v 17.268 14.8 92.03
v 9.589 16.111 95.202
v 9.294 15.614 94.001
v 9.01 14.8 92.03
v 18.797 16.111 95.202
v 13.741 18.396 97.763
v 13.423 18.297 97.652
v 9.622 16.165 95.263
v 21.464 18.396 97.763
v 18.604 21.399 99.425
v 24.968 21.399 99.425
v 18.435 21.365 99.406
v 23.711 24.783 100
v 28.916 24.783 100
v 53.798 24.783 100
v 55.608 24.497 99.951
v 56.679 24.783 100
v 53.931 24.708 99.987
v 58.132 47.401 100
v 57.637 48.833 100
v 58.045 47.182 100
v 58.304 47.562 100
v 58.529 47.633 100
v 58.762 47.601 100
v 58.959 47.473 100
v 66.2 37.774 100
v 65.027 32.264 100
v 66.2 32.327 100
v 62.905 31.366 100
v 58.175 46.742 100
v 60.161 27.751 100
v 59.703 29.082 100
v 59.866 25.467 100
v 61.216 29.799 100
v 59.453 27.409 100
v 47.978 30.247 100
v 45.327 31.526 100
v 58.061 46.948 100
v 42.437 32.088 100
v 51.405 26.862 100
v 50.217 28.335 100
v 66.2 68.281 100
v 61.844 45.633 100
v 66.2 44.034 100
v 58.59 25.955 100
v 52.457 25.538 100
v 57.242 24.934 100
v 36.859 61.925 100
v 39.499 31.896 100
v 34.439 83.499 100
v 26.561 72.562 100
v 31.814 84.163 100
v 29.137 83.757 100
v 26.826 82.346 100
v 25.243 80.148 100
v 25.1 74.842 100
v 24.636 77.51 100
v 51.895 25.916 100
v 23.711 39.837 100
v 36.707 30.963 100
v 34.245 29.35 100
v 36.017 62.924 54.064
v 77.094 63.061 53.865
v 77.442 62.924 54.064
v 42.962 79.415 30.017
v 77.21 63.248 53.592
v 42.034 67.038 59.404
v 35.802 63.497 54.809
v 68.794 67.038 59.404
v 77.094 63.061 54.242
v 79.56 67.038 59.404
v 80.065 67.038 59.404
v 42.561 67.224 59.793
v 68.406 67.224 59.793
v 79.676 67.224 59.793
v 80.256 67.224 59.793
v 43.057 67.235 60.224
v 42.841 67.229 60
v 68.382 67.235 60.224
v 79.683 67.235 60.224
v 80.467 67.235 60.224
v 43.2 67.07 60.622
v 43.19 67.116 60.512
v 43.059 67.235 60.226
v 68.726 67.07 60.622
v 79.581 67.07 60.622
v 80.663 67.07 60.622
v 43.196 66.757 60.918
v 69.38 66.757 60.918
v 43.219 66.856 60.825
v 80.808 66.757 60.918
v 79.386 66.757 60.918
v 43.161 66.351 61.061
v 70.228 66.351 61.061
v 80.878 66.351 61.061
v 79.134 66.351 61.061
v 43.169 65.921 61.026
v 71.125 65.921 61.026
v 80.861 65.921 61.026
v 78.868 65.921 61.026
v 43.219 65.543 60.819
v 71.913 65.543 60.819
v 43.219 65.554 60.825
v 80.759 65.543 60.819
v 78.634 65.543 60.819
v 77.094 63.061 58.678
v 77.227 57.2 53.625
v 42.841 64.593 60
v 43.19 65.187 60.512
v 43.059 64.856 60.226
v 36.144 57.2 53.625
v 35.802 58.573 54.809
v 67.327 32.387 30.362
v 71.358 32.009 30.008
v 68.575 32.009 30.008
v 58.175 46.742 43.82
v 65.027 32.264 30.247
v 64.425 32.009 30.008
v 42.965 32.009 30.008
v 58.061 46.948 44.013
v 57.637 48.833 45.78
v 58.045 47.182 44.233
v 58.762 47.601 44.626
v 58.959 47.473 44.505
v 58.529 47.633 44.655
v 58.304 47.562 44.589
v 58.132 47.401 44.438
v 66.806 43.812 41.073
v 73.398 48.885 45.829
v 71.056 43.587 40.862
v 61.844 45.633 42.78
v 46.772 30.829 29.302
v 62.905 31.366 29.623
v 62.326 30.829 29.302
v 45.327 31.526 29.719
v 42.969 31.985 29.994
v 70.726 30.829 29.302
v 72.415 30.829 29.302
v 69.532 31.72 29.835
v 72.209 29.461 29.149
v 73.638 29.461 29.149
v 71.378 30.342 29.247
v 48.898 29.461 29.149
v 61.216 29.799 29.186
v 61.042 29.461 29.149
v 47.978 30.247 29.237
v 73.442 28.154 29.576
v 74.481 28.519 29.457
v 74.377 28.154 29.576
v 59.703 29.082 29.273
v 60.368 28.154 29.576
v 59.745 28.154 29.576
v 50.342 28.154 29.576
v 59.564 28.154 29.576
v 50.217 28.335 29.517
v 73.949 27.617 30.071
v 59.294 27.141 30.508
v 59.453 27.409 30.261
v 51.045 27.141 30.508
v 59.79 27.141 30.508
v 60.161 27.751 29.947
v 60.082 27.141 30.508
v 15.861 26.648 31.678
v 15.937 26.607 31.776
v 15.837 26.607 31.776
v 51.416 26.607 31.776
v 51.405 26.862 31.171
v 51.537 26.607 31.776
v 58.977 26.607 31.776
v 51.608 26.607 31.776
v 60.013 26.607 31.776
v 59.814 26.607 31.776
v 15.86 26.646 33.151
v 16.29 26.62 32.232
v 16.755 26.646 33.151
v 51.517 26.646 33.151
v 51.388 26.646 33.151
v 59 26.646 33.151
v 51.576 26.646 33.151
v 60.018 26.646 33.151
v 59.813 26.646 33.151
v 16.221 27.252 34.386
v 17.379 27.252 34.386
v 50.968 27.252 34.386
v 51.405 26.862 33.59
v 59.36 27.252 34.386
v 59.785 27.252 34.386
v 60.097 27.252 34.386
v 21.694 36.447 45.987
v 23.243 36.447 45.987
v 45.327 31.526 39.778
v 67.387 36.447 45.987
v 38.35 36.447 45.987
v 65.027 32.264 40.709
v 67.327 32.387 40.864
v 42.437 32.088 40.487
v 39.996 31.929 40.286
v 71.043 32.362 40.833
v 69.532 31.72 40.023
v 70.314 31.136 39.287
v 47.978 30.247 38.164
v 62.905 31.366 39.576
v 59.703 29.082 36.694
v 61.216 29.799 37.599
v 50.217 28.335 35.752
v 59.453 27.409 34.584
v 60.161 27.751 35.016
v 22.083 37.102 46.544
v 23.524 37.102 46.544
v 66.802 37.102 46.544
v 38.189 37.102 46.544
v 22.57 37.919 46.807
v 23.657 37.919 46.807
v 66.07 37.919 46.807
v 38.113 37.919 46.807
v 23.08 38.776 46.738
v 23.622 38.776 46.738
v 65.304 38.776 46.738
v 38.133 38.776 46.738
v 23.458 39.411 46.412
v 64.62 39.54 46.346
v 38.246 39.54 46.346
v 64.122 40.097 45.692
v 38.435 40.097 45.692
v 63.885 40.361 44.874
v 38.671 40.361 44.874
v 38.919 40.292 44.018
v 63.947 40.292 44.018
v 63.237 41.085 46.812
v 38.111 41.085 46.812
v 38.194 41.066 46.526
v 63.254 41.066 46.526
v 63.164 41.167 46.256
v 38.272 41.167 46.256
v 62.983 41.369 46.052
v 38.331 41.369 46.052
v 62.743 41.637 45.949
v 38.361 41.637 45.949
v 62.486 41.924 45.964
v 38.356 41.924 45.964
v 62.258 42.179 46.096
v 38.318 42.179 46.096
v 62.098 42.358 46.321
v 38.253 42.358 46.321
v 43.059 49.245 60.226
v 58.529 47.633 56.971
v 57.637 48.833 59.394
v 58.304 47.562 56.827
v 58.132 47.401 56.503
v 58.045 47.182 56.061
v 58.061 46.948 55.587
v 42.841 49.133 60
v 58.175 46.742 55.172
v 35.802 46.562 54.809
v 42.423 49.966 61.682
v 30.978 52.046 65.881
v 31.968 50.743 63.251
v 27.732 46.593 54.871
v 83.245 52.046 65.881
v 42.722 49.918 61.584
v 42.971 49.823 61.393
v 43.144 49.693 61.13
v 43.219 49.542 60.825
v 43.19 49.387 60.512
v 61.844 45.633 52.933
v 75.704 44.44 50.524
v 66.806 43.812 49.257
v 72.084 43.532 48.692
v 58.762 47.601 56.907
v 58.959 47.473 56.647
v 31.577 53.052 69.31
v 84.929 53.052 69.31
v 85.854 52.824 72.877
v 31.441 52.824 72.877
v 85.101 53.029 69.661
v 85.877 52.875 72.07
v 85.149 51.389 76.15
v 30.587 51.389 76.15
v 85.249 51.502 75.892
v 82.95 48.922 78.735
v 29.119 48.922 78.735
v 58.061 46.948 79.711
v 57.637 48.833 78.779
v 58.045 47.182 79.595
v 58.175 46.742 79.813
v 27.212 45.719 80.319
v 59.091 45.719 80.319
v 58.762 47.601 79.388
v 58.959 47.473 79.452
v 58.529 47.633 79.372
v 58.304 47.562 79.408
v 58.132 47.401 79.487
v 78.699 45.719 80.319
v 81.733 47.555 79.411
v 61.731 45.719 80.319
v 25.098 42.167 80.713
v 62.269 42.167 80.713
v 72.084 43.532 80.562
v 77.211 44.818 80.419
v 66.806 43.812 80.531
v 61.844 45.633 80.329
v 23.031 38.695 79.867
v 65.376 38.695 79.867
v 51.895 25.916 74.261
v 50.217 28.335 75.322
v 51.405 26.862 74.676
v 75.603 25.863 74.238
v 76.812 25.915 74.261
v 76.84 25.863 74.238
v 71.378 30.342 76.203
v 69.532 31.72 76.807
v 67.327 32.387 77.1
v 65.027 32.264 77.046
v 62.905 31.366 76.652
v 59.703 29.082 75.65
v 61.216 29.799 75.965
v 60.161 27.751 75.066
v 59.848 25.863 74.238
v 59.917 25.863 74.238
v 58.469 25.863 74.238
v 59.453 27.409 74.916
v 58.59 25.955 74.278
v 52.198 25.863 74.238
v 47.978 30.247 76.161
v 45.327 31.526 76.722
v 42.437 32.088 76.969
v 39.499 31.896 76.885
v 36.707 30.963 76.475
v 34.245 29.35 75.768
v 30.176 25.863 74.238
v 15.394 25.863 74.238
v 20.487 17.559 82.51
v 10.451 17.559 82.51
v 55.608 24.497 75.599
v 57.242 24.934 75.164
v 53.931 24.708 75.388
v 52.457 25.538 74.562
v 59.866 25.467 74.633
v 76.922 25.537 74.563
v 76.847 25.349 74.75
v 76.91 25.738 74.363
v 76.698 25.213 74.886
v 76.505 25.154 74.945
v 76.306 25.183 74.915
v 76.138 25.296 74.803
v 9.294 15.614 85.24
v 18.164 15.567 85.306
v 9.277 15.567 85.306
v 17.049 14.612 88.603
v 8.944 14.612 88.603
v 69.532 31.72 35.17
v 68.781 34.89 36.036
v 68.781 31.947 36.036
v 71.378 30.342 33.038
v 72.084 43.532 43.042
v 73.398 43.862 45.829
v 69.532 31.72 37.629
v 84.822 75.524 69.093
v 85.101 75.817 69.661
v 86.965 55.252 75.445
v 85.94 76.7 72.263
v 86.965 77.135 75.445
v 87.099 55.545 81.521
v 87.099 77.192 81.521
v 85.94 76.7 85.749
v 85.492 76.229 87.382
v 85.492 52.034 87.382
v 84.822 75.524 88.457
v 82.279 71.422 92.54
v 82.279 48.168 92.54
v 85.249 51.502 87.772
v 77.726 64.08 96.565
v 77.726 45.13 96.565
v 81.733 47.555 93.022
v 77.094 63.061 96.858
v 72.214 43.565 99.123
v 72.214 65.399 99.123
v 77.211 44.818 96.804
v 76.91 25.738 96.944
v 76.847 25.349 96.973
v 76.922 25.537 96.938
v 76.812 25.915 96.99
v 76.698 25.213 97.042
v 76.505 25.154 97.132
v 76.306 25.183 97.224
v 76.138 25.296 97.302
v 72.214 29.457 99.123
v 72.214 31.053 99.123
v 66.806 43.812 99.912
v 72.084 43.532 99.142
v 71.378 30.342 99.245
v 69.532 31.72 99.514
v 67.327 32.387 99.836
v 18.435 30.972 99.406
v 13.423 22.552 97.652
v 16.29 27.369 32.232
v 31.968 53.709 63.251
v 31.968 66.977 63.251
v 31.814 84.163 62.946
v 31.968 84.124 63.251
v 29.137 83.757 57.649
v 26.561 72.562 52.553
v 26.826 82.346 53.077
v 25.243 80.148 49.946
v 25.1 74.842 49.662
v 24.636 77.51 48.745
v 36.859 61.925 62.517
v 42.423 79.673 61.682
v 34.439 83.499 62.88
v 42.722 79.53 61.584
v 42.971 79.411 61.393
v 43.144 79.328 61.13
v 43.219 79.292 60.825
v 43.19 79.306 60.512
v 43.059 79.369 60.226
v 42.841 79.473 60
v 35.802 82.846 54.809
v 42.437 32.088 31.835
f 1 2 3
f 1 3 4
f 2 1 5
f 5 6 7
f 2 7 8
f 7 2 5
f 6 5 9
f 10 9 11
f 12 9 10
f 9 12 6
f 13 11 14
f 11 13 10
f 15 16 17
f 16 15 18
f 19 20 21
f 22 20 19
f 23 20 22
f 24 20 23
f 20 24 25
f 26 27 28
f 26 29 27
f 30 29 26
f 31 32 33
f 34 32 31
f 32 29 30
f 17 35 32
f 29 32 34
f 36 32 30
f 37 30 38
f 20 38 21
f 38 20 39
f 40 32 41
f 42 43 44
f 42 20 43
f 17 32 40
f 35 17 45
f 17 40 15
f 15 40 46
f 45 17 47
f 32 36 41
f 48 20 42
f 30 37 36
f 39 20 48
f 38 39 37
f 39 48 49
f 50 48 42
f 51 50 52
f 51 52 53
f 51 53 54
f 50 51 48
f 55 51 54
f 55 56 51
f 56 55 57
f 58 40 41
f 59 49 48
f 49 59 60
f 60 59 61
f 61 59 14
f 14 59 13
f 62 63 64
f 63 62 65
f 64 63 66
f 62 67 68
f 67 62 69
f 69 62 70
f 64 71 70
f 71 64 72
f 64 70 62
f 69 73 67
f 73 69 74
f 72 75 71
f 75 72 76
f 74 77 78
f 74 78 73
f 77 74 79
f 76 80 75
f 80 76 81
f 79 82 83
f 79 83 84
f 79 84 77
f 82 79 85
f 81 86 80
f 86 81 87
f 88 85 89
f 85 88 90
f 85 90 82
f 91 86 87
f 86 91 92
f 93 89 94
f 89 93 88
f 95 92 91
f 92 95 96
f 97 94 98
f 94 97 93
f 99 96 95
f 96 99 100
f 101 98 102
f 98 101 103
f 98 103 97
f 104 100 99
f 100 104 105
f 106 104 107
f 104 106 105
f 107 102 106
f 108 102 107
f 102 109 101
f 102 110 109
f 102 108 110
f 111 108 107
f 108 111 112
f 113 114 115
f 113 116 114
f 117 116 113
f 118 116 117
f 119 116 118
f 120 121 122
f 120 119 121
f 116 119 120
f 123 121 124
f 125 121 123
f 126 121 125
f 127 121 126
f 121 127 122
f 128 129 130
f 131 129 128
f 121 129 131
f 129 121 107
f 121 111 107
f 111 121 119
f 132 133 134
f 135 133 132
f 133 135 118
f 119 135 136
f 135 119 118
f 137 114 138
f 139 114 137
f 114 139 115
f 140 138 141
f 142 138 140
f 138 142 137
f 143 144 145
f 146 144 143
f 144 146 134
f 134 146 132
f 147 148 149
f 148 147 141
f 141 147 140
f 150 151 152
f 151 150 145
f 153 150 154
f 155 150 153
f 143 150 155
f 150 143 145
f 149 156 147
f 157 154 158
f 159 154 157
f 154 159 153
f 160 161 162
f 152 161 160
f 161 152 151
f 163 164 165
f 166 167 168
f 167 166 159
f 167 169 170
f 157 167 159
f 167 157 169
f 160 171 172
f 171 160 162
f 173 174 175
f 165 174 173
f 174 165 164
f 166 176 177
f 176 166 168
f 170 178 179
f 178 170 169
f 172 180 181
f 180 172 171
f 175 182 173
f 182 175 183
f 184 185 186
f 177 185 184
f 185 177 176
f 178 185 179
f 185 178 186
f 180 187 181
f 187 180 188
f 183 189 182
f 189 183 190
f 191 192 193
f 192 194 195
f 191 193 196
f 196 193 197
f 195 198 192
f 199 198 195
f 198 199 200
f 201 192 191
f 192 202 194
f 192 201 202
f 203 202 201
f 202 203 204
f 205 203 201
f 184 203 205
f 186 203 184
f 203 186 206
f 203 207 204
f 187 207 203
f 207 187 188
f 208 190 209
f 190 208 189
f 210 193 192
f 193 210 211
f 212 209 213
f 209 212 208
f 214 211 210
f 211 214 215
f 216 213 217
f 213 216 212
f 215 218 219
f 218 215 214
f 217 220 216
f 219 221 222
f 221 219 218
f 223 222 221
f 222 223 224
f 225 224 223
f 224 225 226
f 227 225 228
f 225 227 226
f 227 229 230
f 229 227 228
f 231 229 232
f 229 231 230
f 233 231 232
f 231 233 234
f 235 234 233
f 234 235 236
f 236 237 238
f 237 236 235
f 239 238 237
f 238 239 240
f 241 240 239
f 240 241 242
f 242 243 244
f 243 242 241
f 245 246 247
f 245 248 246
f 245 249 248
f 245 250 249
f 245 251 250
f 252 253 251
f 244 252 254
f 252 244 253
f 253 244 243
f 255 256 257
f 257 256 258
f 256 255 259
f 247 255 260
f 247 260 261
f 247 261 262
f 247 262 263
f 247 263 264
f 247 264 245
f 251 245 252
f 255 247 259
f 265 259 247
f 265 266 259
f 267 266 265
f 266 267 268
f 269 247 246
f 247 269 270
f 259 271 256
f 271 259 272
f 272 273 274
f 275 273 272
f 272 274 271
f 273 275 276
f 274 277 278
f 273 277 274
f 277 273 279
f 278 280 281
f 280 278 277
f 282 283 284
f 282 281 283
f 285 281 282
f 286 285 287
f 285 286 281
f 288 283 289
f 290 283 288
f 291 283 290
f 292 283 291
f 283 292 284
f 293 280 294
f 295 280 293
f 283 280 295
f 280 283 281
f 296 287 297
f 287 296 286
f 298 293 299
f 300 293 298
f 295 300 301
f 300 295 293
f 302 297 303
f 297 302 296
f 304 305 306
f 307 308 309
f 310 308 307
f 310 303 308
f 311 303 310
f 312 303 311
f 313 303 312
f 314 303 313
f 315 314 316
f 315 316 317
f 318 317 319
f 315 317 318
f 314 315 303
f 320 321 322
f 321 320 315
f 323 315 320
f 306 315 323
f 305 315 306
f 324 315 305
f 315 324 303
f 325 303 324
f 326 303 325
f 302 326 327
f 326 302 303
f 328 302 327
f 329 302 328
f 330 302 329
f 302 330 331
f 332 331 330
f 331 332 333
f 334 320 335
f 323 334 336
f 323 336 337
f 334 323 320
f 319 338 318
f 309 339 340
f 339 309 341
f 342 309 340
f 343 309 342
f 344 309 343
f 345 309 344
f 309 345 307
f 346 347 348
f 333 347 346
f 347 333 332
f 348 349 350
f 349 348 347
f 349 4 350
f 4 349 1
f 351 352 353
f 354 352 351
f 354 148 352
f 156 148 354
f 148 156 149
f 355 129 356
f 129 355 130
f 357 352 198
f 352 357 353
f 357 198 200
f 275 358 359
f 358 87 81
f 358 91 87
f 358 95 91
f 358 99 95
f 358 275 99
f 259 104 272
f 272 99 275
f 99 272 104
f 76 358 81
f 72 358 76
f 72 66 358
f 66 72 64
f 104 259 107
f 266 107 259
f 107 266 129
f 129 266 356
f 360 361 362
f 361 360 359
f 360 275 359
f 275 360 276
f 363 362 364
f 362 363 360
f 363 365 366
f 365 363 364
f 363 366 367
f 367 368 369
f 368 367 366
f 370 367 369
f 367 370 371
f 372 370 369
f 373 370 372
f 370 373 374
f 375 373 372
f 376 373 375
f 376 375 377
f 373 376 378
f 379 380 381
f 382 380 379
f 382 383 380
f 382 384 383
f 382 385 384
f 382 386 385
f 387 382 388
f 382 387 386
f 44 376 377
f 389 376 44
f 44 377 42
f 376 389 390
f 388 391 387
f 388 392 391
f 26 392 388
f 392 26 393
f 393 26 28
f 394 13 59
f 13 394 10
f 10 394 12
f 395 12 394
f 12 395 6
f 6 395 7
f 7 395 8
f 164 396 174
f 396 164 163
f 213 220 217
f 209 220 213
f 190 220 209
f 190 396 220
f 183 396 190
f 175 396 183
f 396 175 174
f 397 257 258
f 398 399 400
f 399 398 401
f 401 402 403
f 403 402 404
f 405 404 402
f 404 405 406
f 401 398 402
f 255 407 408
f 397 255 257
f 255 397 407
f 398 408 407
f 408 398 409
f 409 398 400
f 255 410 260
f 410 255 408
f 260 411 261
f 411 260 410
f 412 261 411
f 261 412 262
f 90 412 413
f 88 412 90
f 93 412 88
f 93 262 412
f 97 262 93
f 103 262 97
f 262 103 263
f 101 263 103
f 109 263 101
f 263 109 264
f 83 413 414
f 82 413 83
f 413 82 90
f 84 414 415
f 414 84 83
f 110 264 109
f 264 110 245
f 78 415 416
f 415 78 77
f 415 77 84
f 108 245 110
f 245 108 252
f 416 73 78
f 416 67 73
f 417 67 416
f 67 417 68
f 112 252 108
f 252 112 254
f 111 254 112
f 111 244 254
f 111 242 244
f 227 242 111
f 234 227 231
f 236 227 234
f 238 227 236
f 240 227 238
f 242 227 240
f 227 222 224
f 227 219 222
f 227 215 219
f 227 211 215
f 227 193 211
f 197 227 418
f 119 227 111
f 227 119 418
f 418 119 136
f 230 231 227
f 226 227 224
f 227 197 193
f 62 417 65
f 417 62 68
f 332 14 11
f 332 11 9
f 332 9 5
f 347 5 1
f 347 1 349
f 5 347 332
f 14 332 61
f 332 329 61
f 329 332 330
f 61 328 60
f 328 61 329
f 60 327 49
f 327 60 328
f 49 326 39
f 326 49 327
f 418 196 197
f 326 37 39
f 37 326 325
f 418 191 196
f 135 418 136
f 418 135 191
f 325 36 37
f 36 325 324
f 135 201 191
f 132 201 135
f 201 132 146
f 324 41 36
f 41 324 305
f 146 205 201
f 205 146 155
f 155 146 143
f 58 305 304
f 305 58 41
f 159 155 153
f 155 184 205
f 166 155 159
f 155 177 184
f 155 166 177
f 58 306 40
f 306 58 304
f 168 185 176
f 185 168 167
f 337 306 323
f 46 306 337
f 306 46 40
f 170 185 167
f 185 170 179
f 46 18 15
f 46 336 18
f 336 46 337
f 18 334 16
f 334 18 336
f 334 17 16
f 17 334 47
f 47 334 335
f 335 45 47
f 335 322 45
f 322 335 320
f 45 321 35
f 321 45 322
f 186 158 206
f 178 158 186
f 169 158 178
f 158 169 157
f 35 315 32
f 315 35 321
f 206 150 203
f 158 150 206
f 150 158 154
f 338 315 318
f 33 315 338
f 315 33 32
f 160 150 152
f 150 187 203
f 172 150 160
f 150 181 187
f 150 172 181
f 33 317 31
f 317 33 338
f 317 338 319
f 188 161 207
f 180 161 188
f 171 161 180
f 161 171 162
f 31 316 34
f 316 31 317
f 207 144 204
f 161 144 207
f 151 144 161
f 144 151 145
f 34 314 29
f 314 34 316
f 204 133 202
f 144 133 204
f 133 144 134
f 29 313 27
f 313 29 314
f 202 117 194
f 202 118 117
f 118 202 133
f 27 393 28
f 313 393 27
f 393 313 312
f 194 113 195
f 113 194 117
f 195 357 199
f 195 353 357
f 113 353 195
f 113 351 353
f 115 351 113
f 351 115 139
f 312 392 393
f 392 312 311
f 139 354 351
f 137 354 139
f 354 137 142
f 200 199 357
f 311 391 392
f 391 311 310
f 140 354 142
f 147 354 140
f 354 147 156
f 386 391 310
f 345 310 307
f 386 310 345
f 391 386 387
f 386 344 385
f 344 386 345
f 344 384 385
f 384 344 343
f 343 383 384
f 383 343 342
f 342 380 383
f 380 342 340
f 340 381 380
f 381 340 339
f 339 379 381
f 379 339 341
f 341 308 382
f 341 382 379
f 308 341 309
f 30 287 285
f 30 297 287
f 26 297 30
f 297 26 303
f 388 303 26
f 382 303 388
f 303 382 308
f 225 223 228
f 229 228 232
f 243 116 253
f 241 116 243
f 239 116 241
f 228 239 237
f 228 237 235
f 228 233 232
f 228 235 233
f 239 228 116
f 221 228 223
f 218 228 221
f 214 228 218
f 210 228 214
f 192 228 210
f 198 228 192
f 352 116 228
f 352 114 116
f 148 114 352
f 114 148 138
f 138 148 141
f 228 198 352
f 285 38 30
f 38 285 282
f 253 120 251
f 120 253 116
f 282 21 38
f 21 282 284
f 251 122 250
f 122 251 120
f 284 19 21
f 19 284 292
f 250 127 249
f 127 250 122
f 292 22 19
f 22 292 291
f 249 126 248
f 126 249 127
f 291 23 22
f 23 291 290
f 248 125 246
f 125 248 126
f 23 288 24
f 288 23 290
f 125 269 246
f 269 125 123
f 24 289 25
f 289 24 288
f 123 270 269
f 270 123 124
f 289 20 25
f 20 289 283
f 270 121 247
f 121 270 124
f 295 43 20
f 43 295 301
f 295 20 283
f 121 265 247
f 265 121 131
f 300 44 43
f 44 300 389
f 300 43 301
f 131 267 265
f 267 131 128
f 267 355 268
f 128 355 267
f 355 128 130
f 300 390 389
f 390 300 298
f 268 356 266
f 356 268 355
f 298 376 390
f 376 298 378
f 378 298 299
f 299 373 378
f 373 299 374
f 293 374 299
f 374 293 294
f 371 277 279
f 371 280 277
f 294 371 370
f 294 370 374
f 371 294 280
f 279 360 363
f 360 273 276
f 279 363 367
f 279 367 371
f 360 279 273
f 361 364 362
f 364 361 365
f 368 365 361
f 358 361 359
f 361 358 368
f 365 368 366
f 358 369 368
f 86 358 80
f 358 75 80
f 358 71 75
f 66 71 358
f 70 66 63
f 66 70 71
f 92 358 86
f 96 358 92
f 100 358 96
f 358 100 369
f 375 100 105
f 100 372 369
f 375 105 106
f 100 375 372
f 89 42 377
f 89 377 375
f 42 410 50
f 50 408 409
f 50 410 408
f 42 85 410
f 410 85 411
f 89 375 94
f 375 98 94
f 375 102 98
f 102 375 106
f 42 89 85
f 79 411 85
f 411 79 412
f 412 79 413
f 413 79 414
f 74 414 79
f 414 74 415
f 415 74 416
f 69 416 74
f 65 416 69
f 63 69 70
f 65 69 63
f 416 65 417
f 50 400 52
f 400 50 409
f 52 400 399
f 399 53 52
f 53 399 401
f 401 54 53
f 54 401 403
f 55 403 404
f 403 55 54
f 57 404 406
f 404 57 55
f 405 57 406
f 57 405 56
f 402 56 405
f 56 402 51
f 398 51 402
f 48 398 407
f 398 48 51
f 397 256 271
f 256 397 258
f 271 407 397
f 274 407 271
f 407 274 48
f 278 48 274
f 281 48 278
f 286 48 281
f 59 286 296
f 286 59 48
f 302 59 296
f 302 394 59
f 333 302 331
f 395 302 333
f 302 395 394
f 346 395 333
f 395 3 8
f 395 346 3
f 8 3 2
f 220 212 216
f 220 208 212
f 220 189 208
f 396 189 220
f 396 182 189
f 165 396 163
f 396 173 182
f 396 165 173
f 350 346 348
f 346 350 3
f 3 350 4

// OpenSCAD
// Library: round-anything
// Version: 1.0
// Author: IrevDev
// Copyright: 2017
// License: GPL 3
test();

 //callExamples(); //uncomment to view examples
module test()
{

px=buildNIpolygon([[100,0],[100,100],[0,100],[0,0]],8);
py=buildNIpolygon([[100,0],[100,100],[0,100],[0,0]],8);
pz=buildNIpolygon([[100,0],[100,100],[0,100],[0,0]],8);
 
prx=pr(px);
pry=pr(py);
prz=pr(pz);

Rx=polyRound(px,prx,7);
Ry=polyRound(py,pry,7);
Rz=polyRound(pz,prz,7);
intersection(){
rotate([0,-90,0]) translate([0,0,-100])linear_extrude(100,convexity=100)polygon(Rx); 
rotate([90,0,0])translate([0,0,-100]) linear_extrude(100,convexity=100) polygon(Ry); 
 linear_extrude(100,convexity=100) polygon(Rz); 
}

rotate([0,-90,0]) %polyline(px);
rotate([90,0,0])%polyline(py);
%polyline(pz);
rotate([0,-90,0]) %polygon(Rx);
rotate([90,0,0])%polygon(Ry);
%polygon(Rz);
}
function pr(p)=let(Lp1=len(p)-1)[for(i=[0:Lp1]) let(legal=spread(p[ wrap(i-1,Lp1+1)],p[i],p[ wrap(i+1,Lp1+1)]))rnd(0.2* legal,  0.4* legal)];
function spread(p1,p2,p3)=min(
point_to_line(p3,p1,p2)
,
point_to_line(p1,p2,p3)
);
function point_to_line(p,a,b)=
let(
pa = p - a, 
ba = b - a,
h = clamp( (pa*ba)/ (ba*ba)))
norm( pa - ba*h ) ;
function clamp(a, b = 0, c = 1) = min(max(a, b), c); 
function wrap(x,x_max=1,x_min=0) = (((x - x_min) % (x_max - x_min)) + (x_max - x_min)) % (x_max - x_min) + x_min;
function rnd(a = 1, b = 0, s = []) = 
  s == [] ? 
   (rands(min(a, b), max(   a, b), 1)[0]) 
  : 
   (rands(min(a, b), max(a, b), 1, s)[0])
  ; 
module callExamples(){
    //Example of how a parametric part might be designed with this tool 
    width=20;       height=25;
    slotW=8;        slotH=15;
    slotPosition=8;
    minR=1.5;       farcornerR=6;
    internalR=3;
    points=[[0,0],[0,height],[slotPosition,height],[slotPosition,height-slotH],
    [slotPosition+slotW,height-slotH],[slotPosition+slotW,height],[width,height],[width,0]];
    radiuses=[minR,minR,minR,internalR,internalR,minR,minR,farcornerR];
    translate([-30,0,0])polygon(polyRound(points,radiuses));
    %translate([-30,0,0.2])polygon(points);
    
    //Example of features 2
    //   1     2     3      4      5       6     
    b=[[-5,0],[5,3],[0,7],[8,7],[20,20],[10,0]]; //points
    br=[1,     1.5,   0,   10,     1,     10]; //radiuses
    polygon(polyRound(b,br,15));
    %translate([0,0,0.2])polygon(b);
    
    
    //Example of features 3
    //   1     2       3      4       5     6
    p=[[0,0],[0,20],[15,15],[3,10],[15,0],[6,2]];//points
    pr=[1,     1,      0,     3,      1,   10];//radiuses
    translate([25,0,0])polygon(polyRound(p,pr,30));
    %translate([25,0,0.2])polygon(p);
}


function polyRound(p,r,fn=5)=
    //turns the orginal array in (last element, array, first element) since the points are processed 3 at a time.
    let(Lp1=len(p)-1,temp=[for(i=[0:len(p)-1]) 
round3points(
p[wrap(i-1,Lp1+1)],
p[wrap(i+0,Lp1+1)],
p[wrap(i+1,Lp1+1)],
r[wrap(i,Lp1+1)],
fn)])//passes three points at a time to polyRound()
    //temp ends up being a 3 dimensional array where each arc is grouped together, so the below code breaks it up and turns it back into a 2d array, ie list of coordinates (is there a better way of doing this? a way to stop it from becomeing a 3d array in the first place?
    [for (a = temp)
        for (b = a) b];

function round3points(p1,p2,p3,r,fn)=

      dot(un(p1-p2),(p2-p3))>0.98?[ p2  ]
    : 
    let(ang=cosineRuleAngle(p1,p2,p3))//angle between the lines
    let(tangD=r/tan(ang/2))//distance to the tangent point from p2
    let(circD=r/sin(ang/2))//distance to the circle centre from p2
    let(a12=abs(atan(getGradient(p1,p2))))//angle of line 1
    let(a23=abs(atan(getGradient(p2,p3))))//angle of line 2
    
    let(vec21=p1-p2)//vector from p2 to p1
    let(vec23=p3-p2)//vector from p2 to p3
    let(dir21x=vec21[0]==0?0:vec21[0]/abs(vec21[0]))//tangent along line p2 to p1 x polerisation. Returns 1,-1 or 0
    let(dir21y=vec21[1]==0?0:vec21[1]/abs(vec21[1]))//tangent along line p2 to p1 y polerisation. Returns 1,-1 or 0
    let(dir23x=vec23[0]==0?0:vec23[0]/abs(vec23[0]))//tangent along line p3 to p1 x polerisation. Returns 1,-1 or 0
    let(dir23y=vec23[1]==0?0:vec23[1]/abs(vec23[1]))//tangent along line p3 to p1 Y polerisation. Returns 1,-1 or 0
    
    let(t12=[p2[0]+dir21x*cos(a12)*tangD,p2[1]+dir21y*sin(a12)*tangD])//tangent point along line p2 to p2 by offseting from p2
    let(t23=[p2[0]+dir23x*cos(a23)*tangD,p2[1]+dir23y*sin(a23)*tangD])//tangent point along line p2 to p3 by offseting from p2
    
    let(vec_=getMidpoint(t12,t23)-p2)//vector from P1 to the midpoint of the two tangents
    let(dirx_=vec_[0]==0?0:vec_[0]/abs(vec_[0]))//circle center point x polerisation
    let(diry_=vec_[1]==0?0:vec_[1]/abs(vec_[1]))//circle center point y polerisation
    let(a_=abs(atan(getGradient(getMidpoint(t12,t23),p2))))//angle of line from tangent midpoints to p2
    let(cen=[p2[0]+dirx_*cos(a_)*circD,p2[1]+diry_*sin(a_)*circD])//circle center by offseting from p2
    
    let(e1=(p2[0]-p1[0])*(p2[1]+p1[1]))//edge 1
    let(e2=(p3[0]-p2[0])*(p3[1]+p2[1]))//edge 2
    let(e3=(p1[0]-p3[0])*(p1[1]+p3[1]))//edge 3
    let(CWorCCW=(e1+e2+e3)/abs(e1+e2+e3))//rotation of the three points cw or ccw?
   CentreN2PointsArc(t12,t23,cen,CWorCCW,fn);
function dot (a,b)=a*b; // dotproduct is implied in * of vextoes

function un(v)=v/max(norm(v),1e-16);
        
function CentreN2PointsArc(p1,p2,cen,CWorCCW,fn)=
    let(r=pointDist(p1,cen))
    let(CircA1=invtan(p1[0]-cen[0],p1[1]-cen[1]))//angle of line 1
    let(CircA2=cosineRuleAngle(p2,cen,p1))//angle between the lines
    [for(i=[0:fn]) [cos(CircA1+(CircA2/fn)*-i*CWorCCW)*r+cen[0],sin(CircA1+(CircA2/fn)*-i*CWorCCW)*r+cen[1]]];
 
function invtan(run,rise)=
    let(a=abs(atan(rise/run)))
    rise==0&&run>0?0:rise>0&&run>0?a:rise>0&&run==0?90:rise>0&&run<0?180-a:rise==0&&run<0?180:rise<0&&run<0?a+180:rise<0&&run==0?270:rise<0&&run>0?360-a:"error";

function cosineRuleAngle(p1,p2,p3)=
    let(p12=abs(pointDist(p1,p2)))
    let(p13=abs(pointDist(p1,p3)))
    let(p23=abs(pointDist(p2,p3)))
    acos((sq(p23)+sq(p12)-sq(p13))/(2*p23*p12));
    
function getIntersect(m1,m2,k1,k2)=
    let(x=(k2-k1)/(m1-m2))
    let(y=m1*x+k1)
    [x,y];

function sq(x)=x*x;
function getGradient(p1,p2)=(p2[1]-p1[1])/(p2[0]-p1[0]);
function getConstant(p,m)=p[1]-m*p[0];
function getMidpoint(p1,p2)=[(p1[0]+p2[0])/2,(p1[1]+p2[1])/2];
function pointDist(p1,p2)=sqrt(abs(sq(p1[0]-p2[0])+sq(p1[1]-p2[1])));
 module polyline(p) {for(i=[0:max(0,len(p)-1)])line(p[i],p[wrap(i+1,len(p) )]);
}

module line(p1, p2 ,width=0.5) 
{
    hull() {
        translate(p1) sphere(width);
        translate(p2) sphere(width);
    }
}


function brutebuild (c=10)= let (p=[for(i=[1:c] )[rnd(0,100),rnd(0,100)]])
selfintesect(p)?brutebuild(c):p;

function buildNIpolygon(pi,c=6,smooth=0.4)=
let(p=pi==[]?[[rnd(100),rnd(100)],[rnd(100),rnd(100)]]:pi)
c<=0?p:
let(np=concat([lerp([rnd(100),rnd(100)] ,(p[0]+p[last(p)])/2,smooth)],p))
selfintesect(np)?buildNIpolygon(cycle(p,rnd(last(p))),c):buildNIpolygon(cycle(np,rnd(last(p))),c-1,min(1,2/c));
//lerp(p[0],p[last(p)],0.5

 function last(i)=len(i)-1;

function cycle(p,n=1)=[for(i=[0:len(p)-1]) p[wrap(i+n,len(p))]];

function selfintesect(p)=
let(lp1=len(p)-1,lp=lp1+1)
let(allp=
[for(i=[0:lp1])
let(allpi=[for(j=[i:i+lp1-1])
 
let(A=p[wrap(i,lp)])
let(B=p[wrap(i+1,lp)])
let(C=p[wrap(j,lp)])
let(D=p[wrap(j+1,lp)])
intersect(A,B,C,D)
 ]
//,err=echo(allpi)
)
allfalse(allpi)]

//,err=echo(allp)
)
 !alltrue(allp);
;


function  ccw(A,B,C)=
    (C.y-A.y) * (B.x-A.x) > (B.y-A.y) * (C.x-A.x);

function intersect(A,B,C,D)=
A==B||
C==D||
B==C||
B==D||
A==C||
A==D?false:
      ccw(A,C,D) != ccw(B,C,D) && ccw(A,B,C) != ccw(A,B,D);
function wrap(x,x_max=1,x_min=0) = (((x - x_min) % (x_max - x_min)) + (x_max - x_min)) % (x_max - x_min) + x_min;



function rnd(a = 1, b = 0, s = []) = 
  s == [] ? 
   (rands(min(a, b), max(   a, b), 1)[0]) 
  : 
   (rands(min(a, b), max(a, b), 1, s)[0])
  ; 
function lerp(start, end, bias) = (end * bias + start * (1 - bias));

function AvgThree(v1, v2, v3) = (v1 + v2 + v3) / 3;
function alltrue(a) =
let (b = [
  for (i = a) true]) a == b;
function allfalse(a) =
let (b = [
  for (i = a) false]) a == b;
